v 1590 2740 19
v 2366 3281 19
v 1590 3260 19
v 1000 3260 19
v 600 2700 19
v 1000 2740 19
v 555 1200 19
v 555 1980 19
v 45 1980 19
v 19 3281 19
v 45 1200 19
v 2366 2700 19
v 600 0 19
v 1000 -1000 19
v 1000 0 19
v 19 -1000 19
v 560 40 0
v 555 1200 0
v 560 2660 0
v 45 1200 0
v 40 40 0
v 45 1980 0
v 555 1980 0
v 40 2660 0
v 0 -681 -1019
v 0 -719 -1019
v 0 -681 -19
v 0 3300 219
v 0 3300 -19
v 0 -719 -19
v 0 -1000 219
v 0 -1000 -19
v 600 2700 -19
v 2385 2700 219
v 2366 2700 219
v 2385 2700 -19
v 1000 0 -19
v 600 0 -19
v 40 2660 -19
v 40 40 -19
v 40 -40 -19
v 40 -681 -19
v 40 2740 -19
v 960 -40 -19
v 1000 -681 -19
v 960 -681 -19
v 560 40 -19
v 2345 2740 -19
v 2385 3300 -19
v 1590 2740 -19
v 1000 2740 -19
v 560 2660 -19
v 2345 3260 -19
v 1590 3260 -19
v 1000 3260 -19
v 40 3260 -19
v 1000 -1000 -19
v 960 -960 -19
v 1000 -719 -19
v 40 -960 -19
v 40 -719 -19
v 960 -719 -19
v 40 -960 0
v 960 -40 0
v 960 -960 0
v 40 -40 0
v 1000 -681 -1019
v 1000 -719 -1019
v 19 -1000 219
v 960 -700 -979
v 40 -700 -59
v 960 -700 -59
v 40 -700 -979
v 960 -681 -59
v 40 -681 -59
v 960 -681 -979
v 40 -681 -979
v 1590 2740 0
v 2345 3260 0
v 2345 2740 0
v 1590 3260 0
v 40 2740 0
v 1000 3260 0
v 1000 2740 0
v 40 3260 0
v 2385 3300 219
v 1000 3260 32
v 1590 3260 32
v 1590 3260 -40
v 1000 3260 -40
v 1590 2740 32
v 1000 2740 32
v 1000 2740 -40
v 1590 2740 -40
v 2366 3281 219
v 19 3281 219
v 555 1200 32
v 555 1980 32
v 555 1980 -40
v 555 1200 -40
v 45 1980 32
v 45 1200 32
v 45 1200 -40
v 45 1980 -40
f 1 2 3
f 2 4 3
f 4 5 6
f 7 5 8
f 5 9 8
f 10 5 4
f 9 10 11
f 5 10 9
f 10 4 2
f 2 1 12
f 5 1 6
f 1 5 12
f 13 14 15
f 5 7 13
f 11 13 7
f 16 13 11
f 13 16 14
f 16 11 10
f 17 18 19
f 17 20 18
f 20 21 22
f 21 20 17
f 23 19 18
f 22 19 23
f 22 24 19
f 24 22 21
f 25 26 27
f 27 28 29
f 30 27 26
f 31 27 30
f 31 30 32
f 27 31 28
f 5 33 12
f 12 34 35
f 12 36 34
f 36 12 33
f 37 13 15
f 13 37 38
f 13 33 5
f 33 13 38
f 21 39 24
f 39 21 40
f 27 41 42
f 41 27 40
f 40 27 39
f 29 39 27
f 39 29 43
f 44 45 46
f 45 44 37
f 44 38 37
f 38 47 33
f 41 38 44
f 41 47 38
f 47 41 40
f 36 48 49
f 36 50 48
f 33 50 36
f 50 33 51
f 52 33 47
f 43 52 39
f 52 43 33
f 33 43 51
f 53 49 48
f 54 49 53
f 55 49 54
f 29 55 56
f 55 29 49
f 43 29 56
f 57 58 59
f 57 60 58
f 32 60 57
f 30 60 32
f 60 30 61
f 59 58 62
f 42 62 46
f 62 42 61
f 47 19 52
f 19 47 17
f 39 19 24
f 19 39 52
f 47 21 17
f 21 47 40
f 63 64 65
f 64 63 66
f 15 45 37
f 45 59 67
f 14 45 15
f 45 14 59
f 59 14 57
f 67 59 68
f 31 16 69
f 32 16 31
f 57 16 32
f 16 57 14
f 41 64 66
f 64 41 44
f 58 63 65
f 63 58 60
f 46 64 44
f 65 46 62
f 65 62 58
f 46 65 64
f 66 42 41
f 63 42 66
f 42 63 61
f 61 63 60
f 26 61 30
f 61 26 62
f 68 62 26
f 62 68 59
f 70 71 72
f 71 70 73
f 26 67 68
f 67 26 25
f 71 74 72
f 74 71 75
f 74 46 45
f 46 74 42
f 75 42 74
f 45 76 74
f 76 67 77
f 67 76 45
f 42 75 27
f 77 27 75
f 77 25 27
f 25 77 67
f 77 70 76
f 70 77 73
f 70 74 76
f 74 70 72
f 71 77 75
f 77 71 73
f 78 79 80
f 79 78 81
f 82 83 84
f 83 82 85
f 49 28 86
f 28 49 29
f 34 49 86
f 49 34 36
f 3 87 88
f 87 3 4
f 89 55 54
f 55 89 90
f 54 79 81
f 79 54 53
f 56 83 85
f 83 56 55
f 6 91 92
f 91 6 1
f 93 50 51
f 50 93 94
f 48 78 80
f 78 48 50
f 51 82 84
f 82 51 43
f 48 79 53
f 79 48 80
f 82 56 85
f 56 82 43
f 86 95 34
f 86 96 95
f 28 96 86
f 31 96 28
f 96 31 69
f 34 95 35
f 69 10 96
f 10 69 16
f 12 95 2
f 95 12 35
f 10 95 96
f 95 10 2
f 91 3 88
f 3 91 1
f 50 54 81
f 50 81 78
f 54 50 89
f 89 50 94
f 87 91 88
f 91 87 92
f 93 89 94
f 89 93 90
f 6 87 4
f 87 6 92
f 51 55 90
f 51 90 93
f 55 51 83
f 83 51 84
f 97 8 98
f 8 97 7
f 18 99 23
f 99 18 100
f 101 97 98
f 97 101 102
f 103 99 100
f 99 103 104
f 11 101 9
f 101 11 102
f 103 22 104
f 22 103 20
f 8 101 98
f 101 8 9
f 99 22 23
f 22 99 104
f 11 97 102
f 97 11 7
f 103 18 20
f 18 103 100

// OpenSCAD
// file: panels.scad
$t = 19;

function odd(x) = (x % 2) == 1;

module plank(length, width = 200, thickness = $t) {
	echo("plank", [width, length, thickness]);
	cube([width, length, thickness]);
}

module panel(length, width = 600, thickness = $t, plank_width = 200, backing_width = 40) {
	count = floor(width / plank_width);
	
	for (x = [0:1:count-1]) {
		color(odd(x) ? [0.8, 0.4, 0.1] : [0.7, 0.4, 0.1])
		translate([x * plank_width, 0, 0]) plank(length, plank_width, thickness);
	}
	
	color([0.8, 0.45, 0.1])
	translate([0, 0, -thickness]) {
		plank(length, backing_width);
		translate([width - backing_width, 0, 0]) plank(length, backing_width);
	}
	
	color([0.8, 0.35, 0.3])
	translate([backing_width, length, -thickness]) rotate([0, 0, -90]) {
		plank(width - backing_width*2, backing_width);
		translate([length-backing_width, 0, 0]) plank(width - backing_width*2, backing_width);
	}
}
// main file
use <panels.scad>;

thickness = 19;

panel(2700);

rotate([0, 0, -90]) panel(1000, width=1000);
translate([0, -700, -thickness]) rotate([0, 90, -90]) panel(1000, width=1000);

translate([0, 600 + 2700, 0]) rotate([0, 0, -90]) panel(2385);

// Vertical walls

color([0.8, 0.4, 0.1]) {
	translate([thickness, -1000, thickness]) rotate([0, -90, 0]) plank(1000 + 2700 + 600, 200);
	
	translate([2385, 2700, thickness]) rotate([0, -90, 0]) plank(600, 200);
	
	translate([thickness, 2700+600-thickness, thickness]) rotate([0, -90, -90]) plank(2385 - thickness*2, 200);
}

// Cooking hob

color([0.1, 0.1, 0.1])
translate([1000, 2700 - (520-600) / 2, -40]) cube([590, 520, 72]);

// Sink

color([0.9, 0.9, 0.9])
translate([-(510-600) / 2, 1200, -40]) 
cube([510, 780, 72]);
